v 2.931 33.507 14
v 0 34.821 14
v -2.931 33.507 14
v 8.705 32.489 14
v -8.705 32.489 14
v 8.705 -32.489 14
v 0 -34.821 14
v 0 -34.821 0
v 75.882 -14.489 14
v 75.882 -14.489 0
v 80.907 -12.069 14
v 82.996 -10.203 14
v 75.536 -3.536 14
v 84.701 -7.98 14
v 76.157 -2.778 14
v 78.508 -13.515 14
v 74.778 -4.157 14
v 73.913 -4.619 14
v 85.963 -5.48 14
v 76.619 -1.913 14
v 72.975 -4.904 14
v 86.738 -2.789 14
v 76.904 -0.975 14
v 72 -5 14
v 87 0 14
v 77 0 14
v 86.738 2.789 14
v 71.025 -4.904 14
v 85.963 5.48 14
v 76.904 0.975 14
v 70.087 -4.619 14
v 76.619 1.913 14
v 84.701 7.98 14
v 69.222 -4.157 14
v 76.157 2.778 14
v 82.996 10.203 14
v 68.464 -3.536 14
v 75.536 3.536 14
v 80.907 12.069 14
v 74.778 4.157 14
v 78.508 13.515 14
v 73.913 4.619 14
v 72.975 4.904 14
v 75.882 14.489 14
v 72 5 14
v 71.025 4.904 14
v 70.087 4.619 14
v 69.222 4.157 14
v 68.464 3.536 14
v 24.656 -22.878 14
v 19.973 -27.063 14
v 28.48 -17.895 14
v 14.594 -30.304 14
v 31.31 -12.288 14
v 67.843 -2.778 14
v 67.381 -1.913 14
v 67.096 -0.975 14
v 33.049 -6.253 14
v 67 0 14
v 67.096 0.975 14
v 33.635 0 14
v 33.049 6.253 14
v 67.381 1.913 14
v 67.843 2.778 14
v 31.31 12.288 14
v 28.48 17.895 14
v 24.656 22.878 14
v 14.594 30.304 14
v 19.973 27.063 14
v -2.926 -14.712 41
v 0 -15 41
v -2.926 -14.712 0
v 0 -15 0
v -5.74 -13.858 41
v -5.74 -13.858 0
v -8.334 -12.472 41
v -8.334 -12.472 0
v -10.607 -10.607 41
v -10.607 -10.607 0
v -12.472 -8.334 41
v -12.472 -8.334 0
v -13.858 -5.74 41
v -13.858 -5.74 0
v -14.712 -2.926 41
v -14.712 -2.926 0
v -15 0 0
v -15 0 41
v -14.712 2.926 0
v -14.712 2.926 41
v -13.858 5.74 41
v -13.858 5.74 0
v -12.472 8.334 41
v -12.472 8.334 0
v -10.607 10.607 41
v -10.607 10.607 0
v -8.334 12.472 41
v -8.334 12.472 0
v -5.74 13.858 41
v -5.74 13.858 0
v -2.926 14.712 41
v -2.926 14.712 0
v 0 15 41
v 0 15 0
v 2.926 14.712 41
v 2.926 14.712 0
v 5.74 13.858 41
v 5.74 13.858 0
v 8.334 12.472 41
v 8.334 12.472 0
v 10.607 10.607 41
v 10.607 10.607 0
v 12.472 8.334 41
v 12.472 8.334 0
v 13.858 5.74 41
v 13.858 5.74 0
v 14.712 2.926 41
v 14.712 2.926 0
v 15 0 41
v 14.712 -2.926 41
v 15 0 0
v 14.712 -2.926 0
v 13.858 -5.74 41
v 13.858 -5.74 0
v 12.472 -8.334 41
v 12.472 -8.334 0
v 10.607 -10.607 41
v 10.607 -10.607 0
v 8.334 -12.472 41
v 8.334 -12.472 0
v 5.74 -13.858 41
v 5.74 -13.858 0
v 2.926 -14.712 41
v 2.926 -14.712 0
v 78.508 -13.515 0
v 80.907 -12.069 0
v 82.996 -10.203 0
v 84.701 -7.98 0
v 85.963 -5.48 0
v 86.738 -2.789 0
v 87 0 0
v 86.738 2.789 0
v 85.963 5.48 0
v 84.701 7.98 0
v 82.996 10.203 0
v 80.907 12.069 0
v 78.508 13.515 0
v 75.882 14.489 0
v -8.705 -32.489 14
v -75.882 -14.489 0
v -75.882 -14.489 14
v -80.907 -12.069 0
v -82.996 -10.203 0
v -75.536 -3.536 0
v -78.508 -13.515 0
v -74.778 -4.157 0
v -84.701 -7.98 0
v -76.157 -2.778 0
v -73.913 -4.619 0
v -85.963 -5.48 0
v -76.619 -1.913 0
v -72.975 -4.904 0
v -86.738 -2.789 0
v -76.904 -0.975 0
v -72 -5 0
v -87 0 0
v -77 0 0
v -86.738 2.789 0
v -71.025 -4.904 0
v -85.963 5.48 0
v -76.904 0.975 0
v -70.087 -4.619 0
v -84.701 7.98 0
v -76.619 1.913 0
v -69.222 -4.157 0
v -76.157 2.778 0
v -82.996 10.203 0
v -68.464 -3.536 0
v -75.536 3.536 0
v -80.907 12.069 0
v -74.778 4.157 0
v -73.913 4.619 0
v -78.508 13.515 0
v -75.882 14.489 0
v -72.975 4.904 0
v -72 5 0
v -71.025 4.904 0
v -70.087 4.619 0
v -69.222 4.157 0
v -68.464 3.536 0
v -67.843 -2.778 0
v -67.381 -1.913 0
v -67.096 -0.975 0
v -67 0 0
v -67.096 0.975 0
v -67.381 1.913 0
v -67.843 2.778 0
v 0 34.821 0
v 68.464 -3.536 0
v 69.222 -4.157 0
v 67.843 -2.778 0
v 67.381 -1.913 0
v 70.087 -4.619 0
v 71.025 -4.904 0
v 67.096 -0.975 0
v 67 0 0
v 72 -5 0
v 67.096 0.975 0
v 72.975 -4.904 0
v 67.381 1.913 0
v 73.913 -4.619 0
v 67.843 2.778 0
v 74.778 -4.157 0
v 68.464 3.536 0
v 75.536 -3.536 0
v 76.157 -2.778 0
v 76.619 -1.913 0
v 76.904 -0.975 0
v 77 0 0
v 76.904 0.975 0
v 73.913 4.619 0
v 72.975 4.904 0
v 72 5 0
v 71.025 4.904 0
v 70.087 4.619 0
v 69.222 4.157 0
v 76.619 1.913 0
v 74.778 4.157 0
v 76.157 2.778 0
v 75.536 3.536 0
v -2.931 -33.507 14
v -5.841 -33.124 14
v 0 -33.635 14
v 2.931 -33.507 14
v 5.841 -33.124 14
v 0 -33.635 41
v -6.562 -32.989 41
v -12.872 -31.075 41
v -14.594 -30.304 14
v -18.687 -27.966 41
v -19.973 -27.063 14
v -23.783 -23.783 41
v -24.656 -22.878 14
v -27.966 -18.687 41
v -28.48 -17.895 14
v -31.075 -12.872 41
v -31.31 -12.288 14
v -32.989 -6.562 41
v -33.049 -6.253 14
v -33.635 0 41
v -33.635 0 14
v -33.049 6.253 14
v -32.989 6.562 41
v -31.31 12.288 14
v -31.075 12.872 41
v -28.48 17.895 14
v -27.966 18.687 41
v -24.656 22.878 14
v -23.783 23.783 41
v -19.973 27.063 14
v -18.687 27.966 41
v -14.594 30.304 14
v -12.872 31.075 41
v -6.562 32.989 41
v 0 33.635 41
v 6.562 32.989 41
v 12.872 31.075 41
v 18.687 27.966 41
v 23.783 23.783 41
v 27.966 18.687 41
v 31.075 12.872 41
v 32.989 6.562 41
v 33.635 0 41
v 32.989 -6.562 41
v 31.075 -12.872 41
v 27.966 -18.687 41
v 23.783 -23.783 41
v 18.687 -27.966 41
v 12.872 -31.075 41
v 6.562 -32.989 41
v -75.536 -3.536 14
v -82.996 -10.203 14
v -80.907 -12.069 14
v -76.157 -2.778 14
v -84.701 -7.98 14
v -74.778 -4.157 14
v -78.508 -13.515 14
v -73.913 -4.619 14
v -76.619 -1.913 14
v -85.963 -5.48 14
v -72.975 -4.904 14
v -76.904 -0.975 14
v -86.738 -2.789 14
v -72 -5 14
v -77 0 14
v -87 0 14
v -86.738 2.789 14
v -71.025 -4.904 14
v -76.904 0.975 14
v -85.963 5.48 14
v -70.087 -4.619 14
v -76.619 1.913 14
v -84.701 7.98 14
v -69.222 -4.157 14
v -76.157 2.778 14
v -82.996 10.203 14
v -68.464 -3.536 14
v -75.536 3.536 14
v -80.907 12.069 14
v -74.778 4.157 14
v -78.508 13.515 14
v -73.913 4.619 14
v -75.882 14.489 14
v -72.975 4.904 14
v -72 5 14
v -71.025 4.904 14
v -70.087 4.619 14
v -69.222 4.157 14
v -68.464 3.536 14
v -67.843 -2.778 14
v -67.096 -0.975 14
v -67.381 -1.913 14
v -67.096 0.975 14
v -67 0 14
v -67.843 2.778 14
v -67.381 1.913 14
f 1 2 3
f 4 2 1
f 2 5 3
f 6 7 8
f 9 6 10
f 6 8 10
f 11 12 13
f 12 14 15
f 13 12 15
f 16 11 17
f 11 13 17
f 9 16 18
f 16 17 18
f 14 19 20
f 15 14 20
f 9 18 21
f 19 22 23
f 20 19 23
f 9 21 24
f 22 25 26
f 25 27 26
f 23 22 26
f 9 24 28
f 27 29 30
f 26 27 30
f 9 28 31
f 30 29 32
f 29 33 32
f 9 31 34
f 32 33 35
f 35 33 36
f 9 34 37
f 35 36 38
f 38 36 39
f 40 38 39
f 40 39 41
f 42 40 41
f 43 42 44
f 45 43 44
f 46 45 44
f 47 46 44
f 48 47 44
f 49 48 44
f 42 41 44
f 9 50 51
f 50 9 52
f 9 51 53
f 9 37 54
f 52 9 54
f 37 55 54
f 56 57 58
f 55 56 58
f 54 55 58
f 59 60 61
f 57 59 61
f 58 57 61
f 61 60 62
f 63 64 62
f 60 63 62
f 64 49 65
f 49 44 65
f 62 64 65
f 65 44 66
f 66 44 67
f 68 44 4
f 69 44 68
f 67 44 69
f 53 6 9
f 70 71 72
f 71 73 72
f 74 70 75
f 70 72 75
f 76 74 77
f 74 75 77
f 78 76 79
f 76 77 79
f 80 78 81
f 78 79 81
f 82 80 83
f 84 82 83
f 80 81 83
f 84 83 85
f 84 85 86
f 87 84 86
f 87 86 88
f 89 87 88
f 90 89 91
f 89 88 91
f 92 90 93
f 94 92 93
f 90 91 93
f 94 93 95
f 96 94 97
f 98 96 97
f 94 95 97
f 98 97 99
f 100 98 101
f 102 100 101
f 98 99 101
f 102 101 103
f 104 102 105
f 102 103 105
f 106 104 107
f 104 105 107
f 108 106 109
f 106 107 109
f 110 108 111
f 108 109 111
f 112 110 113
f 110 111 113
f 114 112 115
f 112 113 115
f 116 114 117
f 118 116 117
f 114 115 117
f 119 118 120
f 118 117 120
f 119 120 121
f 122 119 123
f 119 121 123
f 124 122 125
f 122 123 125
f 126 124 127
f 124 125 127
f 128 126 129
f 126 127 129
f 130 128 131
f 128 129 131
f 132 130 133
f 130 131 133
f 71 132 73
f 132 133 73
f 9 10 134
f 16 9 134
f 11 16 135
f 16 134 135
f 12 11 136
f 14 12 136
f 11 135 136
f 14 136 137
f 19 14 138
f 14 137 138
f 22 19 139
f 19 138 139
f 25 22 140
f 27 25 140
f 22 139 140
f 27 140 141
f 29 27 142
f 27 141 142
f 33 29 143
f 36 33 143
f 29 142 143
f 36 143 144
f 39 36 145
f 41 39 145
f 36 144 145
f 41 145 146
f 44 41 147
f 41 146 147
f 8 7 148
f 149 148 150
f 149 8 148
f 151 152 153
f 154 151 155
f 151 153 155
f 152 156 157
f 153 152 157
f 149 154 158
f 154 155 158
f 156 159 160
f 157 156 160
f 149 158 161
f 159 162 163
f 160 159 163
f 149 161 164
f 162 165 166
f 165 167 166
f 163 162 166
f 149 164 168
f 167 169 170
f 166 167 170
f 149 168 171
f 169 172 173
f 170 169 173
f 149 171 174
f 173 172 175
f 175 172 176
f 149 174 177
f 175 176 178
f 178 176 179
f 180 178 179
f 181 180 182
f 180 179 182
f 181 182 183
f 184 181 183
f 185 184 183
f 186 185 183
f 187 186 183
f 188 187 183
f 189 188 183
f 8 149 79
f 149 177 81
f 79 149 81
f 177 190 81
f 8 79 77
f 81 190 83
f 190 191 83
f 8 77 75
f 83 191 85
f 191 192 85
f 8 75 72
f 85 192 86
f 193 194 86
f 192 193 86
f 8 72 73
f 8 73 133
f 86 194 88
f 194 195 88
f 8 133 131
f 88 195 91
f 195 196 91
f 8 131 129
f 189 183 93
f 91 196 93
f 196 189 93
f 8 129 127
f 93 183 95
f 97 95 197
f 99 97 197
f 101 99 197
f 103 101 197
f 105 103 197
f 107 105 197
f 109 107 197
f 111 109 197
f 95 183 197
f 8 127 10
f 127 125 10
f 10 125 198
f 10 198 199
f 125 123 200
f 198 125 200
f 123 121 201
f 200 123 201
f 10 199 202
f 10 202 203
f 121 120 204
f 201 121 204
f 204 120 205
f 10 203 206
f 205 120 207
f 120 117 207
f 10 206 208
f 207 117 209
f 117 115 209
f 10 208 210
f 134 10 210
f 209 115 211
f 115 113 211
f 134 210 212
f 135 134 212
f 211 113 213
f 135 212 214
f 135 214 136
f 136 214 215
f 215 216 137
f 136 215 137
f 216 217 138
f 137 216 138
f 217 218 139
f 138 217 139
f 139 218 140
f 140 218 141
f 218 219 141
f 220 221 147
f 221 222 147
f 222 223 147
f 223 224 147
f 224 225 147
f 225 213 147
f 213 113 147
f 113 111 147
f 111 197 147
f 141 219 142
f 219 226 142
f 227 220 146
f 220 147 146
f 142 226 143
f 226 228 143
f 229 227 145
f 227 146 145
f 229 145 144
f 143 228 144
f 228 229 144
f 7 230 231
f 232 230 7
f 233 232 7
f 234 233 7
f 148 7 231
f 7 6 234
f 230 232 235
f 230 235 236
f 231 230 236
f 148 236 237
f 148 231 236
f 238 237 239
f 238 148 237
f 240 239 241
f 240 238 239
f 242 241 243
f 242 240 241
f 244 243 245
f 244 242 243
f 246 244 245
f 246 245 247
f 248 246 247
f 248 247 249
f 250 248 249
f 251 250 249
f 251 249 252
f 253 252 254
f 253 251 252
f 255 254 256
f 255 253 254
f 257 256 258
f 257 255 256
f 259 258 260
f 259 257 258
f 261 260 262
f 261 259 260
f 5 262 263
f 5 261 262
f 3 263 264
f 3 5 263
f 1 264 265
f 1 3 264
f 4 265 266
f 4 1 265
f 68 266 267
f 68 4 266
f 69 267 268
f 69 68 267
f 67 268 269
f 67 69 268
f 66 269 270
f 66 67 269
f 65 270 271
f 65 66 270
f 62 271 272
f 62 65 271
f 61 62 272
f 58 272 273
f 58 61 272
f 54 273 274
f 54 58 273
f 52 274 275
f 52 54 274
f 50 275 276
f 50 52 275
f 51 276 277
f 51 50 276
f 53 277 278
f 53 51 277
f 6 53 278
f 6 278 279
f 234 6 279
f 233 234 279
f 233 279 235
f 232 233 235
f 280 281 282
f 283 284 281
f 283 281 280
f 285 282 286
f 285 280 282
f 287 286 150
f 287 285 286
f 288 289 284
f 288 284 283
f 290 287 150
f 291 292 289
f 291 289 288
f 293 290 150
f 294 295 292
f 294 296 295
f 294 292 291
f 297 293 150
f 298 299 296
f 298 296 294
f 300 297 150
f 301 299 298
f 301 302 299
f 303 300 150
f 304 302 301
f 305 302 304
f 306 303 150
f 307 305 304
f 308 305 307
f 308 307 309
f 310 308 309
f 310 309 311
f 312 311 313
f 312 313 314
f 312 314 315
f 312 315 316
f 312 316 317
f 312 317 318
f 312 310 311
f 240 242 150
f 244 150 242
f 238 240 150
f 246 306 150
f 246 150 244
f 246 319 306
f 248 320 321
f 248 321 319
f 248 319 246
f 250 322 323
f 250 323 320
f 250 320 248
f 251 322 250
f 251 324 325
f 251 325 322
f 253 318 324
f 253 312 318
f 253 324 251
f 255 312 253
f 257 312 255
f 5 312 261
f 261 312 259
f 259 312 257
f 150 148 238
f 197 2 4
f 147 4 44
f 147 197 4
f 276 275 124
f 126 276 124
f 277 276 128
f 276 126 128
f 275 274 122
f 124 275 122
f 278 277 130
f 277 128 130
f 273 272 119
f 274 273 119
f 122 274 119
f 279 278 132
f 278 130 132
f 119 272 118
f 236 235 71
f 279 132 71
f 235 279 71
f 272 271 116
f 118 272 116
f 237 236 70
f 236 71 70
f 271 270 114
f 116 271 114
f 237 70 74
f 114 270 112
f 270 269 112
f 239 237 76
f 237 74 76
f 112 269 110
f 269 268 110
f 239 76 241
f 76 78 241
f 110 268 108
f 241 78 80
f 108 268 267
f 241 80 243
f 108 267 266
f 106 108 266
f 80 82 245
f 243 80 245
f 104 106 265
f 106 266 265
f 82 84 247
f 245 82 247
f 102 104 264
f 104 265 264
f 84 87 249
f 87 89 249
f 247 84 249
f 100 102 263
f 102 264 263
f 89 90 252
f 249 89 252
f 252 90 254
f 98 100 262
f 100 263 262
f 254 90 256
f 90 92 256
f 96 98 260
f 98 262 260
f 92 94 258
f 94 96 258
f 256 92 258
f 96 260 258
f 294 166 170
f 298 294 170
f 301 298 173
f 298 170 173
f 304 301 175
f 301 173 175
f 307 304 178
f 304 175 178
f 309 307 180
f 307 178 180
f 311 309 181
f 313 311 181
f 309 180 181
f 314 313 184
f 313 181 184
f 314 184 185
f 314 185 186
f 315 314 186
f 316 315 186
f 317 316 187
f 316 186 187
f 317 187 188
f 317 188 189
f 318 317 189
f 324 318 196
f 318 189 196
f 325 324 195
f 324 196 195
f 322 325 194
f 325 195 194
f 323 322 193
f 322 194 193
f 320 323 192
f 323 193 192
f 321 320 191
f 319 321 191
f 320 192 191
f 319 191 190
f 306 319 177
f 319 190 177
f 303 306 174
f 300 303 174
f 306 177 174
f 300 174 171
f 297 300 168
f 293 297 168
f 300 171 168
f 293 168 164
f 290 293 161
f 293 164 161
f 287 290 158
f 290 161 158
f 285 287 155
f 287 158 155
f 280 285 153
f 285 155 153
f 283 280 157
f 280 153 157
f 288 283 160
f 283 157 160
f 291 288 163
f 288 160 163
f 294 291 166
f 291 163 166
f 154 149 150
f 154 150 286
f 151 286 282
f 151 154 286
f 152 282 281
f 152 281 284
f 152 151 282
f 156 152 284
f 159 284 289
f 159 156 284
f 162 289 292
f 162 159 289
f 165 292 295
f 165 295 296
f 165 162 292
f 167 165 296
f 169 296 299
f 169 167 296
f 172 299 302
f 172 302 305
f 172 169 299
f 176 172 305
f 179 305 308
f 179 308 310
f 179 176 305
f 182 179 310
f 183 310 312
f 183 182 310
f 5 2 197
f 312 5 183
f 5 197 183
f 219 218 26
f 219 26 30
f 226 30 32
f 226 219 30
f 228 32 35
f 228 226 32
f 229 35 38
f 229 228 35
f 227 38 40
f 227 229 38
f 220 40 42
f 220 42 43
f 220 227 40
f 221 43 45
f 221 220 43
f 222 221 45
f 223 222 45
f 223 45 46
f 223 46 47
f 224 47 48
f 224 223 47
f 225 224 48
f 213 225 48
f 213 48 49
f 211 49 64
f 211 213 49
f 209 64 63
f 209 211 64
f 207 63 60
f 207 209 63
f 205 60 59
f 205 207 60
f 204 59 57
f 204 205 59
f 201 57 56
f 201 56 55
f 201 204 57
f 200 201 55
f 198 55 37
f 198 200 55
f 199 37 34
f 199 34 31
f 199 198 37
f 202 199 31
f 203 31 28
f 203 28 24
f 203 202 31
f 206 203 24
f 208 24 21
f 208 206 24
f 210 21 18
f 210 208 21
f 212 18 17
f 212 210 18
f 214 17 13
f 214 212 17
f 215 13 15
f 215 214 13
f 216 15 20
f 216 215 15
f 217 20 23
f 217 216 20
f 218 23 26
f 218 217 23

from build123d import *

# Parameters (mm, degrees)
SKETCH_R     = 5
PAD_DEPTH    = 14
PAD001_DEPTH = 27


with BuildPart() as part:
    # Sketch → Pad (new body)
    with BuildSketch(Plane.XY):
        with BuildLine():
            Line((0, 34.821453), (75.88228, 14.488889))
            ThreePointArc((75.88228, -14.488889), (87, 0), (75.88228, 14.488889))
            Line((0, -34.821453), (75.88228, -14.488889))
            Line((0, -15), (0, -34.821453))
            ThreePointArc((0, -15), (15, 0), (0, 15))
            Line((0, 34.821453), (0, 15))
        make_face()
        with Locations((72, 0)):
            Circle(SKETCH_R, mode=Mode.SUBTRACT)
    extrude(amount=PAD_DEPTH)

    # Sketch001 (on Face9 of Pad) → Pad001 (join)
    with BuildSketch(Plane.XY.offset(14)):
        with BuildLine():
            ThreePointArc((0, -33.634944), (33.634944, 0), (0, 33.634944))
            Line((0, 15), (0, 33.634944))
            ThreePointArc((0, -15), (15, 0), (0, 15))
            Line((0, -15), (0, -33.634944))
        make_face()
    extrude(amount=PAD001_DEPTH)

    # Mirrored: part across YZ


with BuildPart() as part_1:
    add(part.part)
    add(part.part.mirror(Plane.YZ))


solid = part_1.part
